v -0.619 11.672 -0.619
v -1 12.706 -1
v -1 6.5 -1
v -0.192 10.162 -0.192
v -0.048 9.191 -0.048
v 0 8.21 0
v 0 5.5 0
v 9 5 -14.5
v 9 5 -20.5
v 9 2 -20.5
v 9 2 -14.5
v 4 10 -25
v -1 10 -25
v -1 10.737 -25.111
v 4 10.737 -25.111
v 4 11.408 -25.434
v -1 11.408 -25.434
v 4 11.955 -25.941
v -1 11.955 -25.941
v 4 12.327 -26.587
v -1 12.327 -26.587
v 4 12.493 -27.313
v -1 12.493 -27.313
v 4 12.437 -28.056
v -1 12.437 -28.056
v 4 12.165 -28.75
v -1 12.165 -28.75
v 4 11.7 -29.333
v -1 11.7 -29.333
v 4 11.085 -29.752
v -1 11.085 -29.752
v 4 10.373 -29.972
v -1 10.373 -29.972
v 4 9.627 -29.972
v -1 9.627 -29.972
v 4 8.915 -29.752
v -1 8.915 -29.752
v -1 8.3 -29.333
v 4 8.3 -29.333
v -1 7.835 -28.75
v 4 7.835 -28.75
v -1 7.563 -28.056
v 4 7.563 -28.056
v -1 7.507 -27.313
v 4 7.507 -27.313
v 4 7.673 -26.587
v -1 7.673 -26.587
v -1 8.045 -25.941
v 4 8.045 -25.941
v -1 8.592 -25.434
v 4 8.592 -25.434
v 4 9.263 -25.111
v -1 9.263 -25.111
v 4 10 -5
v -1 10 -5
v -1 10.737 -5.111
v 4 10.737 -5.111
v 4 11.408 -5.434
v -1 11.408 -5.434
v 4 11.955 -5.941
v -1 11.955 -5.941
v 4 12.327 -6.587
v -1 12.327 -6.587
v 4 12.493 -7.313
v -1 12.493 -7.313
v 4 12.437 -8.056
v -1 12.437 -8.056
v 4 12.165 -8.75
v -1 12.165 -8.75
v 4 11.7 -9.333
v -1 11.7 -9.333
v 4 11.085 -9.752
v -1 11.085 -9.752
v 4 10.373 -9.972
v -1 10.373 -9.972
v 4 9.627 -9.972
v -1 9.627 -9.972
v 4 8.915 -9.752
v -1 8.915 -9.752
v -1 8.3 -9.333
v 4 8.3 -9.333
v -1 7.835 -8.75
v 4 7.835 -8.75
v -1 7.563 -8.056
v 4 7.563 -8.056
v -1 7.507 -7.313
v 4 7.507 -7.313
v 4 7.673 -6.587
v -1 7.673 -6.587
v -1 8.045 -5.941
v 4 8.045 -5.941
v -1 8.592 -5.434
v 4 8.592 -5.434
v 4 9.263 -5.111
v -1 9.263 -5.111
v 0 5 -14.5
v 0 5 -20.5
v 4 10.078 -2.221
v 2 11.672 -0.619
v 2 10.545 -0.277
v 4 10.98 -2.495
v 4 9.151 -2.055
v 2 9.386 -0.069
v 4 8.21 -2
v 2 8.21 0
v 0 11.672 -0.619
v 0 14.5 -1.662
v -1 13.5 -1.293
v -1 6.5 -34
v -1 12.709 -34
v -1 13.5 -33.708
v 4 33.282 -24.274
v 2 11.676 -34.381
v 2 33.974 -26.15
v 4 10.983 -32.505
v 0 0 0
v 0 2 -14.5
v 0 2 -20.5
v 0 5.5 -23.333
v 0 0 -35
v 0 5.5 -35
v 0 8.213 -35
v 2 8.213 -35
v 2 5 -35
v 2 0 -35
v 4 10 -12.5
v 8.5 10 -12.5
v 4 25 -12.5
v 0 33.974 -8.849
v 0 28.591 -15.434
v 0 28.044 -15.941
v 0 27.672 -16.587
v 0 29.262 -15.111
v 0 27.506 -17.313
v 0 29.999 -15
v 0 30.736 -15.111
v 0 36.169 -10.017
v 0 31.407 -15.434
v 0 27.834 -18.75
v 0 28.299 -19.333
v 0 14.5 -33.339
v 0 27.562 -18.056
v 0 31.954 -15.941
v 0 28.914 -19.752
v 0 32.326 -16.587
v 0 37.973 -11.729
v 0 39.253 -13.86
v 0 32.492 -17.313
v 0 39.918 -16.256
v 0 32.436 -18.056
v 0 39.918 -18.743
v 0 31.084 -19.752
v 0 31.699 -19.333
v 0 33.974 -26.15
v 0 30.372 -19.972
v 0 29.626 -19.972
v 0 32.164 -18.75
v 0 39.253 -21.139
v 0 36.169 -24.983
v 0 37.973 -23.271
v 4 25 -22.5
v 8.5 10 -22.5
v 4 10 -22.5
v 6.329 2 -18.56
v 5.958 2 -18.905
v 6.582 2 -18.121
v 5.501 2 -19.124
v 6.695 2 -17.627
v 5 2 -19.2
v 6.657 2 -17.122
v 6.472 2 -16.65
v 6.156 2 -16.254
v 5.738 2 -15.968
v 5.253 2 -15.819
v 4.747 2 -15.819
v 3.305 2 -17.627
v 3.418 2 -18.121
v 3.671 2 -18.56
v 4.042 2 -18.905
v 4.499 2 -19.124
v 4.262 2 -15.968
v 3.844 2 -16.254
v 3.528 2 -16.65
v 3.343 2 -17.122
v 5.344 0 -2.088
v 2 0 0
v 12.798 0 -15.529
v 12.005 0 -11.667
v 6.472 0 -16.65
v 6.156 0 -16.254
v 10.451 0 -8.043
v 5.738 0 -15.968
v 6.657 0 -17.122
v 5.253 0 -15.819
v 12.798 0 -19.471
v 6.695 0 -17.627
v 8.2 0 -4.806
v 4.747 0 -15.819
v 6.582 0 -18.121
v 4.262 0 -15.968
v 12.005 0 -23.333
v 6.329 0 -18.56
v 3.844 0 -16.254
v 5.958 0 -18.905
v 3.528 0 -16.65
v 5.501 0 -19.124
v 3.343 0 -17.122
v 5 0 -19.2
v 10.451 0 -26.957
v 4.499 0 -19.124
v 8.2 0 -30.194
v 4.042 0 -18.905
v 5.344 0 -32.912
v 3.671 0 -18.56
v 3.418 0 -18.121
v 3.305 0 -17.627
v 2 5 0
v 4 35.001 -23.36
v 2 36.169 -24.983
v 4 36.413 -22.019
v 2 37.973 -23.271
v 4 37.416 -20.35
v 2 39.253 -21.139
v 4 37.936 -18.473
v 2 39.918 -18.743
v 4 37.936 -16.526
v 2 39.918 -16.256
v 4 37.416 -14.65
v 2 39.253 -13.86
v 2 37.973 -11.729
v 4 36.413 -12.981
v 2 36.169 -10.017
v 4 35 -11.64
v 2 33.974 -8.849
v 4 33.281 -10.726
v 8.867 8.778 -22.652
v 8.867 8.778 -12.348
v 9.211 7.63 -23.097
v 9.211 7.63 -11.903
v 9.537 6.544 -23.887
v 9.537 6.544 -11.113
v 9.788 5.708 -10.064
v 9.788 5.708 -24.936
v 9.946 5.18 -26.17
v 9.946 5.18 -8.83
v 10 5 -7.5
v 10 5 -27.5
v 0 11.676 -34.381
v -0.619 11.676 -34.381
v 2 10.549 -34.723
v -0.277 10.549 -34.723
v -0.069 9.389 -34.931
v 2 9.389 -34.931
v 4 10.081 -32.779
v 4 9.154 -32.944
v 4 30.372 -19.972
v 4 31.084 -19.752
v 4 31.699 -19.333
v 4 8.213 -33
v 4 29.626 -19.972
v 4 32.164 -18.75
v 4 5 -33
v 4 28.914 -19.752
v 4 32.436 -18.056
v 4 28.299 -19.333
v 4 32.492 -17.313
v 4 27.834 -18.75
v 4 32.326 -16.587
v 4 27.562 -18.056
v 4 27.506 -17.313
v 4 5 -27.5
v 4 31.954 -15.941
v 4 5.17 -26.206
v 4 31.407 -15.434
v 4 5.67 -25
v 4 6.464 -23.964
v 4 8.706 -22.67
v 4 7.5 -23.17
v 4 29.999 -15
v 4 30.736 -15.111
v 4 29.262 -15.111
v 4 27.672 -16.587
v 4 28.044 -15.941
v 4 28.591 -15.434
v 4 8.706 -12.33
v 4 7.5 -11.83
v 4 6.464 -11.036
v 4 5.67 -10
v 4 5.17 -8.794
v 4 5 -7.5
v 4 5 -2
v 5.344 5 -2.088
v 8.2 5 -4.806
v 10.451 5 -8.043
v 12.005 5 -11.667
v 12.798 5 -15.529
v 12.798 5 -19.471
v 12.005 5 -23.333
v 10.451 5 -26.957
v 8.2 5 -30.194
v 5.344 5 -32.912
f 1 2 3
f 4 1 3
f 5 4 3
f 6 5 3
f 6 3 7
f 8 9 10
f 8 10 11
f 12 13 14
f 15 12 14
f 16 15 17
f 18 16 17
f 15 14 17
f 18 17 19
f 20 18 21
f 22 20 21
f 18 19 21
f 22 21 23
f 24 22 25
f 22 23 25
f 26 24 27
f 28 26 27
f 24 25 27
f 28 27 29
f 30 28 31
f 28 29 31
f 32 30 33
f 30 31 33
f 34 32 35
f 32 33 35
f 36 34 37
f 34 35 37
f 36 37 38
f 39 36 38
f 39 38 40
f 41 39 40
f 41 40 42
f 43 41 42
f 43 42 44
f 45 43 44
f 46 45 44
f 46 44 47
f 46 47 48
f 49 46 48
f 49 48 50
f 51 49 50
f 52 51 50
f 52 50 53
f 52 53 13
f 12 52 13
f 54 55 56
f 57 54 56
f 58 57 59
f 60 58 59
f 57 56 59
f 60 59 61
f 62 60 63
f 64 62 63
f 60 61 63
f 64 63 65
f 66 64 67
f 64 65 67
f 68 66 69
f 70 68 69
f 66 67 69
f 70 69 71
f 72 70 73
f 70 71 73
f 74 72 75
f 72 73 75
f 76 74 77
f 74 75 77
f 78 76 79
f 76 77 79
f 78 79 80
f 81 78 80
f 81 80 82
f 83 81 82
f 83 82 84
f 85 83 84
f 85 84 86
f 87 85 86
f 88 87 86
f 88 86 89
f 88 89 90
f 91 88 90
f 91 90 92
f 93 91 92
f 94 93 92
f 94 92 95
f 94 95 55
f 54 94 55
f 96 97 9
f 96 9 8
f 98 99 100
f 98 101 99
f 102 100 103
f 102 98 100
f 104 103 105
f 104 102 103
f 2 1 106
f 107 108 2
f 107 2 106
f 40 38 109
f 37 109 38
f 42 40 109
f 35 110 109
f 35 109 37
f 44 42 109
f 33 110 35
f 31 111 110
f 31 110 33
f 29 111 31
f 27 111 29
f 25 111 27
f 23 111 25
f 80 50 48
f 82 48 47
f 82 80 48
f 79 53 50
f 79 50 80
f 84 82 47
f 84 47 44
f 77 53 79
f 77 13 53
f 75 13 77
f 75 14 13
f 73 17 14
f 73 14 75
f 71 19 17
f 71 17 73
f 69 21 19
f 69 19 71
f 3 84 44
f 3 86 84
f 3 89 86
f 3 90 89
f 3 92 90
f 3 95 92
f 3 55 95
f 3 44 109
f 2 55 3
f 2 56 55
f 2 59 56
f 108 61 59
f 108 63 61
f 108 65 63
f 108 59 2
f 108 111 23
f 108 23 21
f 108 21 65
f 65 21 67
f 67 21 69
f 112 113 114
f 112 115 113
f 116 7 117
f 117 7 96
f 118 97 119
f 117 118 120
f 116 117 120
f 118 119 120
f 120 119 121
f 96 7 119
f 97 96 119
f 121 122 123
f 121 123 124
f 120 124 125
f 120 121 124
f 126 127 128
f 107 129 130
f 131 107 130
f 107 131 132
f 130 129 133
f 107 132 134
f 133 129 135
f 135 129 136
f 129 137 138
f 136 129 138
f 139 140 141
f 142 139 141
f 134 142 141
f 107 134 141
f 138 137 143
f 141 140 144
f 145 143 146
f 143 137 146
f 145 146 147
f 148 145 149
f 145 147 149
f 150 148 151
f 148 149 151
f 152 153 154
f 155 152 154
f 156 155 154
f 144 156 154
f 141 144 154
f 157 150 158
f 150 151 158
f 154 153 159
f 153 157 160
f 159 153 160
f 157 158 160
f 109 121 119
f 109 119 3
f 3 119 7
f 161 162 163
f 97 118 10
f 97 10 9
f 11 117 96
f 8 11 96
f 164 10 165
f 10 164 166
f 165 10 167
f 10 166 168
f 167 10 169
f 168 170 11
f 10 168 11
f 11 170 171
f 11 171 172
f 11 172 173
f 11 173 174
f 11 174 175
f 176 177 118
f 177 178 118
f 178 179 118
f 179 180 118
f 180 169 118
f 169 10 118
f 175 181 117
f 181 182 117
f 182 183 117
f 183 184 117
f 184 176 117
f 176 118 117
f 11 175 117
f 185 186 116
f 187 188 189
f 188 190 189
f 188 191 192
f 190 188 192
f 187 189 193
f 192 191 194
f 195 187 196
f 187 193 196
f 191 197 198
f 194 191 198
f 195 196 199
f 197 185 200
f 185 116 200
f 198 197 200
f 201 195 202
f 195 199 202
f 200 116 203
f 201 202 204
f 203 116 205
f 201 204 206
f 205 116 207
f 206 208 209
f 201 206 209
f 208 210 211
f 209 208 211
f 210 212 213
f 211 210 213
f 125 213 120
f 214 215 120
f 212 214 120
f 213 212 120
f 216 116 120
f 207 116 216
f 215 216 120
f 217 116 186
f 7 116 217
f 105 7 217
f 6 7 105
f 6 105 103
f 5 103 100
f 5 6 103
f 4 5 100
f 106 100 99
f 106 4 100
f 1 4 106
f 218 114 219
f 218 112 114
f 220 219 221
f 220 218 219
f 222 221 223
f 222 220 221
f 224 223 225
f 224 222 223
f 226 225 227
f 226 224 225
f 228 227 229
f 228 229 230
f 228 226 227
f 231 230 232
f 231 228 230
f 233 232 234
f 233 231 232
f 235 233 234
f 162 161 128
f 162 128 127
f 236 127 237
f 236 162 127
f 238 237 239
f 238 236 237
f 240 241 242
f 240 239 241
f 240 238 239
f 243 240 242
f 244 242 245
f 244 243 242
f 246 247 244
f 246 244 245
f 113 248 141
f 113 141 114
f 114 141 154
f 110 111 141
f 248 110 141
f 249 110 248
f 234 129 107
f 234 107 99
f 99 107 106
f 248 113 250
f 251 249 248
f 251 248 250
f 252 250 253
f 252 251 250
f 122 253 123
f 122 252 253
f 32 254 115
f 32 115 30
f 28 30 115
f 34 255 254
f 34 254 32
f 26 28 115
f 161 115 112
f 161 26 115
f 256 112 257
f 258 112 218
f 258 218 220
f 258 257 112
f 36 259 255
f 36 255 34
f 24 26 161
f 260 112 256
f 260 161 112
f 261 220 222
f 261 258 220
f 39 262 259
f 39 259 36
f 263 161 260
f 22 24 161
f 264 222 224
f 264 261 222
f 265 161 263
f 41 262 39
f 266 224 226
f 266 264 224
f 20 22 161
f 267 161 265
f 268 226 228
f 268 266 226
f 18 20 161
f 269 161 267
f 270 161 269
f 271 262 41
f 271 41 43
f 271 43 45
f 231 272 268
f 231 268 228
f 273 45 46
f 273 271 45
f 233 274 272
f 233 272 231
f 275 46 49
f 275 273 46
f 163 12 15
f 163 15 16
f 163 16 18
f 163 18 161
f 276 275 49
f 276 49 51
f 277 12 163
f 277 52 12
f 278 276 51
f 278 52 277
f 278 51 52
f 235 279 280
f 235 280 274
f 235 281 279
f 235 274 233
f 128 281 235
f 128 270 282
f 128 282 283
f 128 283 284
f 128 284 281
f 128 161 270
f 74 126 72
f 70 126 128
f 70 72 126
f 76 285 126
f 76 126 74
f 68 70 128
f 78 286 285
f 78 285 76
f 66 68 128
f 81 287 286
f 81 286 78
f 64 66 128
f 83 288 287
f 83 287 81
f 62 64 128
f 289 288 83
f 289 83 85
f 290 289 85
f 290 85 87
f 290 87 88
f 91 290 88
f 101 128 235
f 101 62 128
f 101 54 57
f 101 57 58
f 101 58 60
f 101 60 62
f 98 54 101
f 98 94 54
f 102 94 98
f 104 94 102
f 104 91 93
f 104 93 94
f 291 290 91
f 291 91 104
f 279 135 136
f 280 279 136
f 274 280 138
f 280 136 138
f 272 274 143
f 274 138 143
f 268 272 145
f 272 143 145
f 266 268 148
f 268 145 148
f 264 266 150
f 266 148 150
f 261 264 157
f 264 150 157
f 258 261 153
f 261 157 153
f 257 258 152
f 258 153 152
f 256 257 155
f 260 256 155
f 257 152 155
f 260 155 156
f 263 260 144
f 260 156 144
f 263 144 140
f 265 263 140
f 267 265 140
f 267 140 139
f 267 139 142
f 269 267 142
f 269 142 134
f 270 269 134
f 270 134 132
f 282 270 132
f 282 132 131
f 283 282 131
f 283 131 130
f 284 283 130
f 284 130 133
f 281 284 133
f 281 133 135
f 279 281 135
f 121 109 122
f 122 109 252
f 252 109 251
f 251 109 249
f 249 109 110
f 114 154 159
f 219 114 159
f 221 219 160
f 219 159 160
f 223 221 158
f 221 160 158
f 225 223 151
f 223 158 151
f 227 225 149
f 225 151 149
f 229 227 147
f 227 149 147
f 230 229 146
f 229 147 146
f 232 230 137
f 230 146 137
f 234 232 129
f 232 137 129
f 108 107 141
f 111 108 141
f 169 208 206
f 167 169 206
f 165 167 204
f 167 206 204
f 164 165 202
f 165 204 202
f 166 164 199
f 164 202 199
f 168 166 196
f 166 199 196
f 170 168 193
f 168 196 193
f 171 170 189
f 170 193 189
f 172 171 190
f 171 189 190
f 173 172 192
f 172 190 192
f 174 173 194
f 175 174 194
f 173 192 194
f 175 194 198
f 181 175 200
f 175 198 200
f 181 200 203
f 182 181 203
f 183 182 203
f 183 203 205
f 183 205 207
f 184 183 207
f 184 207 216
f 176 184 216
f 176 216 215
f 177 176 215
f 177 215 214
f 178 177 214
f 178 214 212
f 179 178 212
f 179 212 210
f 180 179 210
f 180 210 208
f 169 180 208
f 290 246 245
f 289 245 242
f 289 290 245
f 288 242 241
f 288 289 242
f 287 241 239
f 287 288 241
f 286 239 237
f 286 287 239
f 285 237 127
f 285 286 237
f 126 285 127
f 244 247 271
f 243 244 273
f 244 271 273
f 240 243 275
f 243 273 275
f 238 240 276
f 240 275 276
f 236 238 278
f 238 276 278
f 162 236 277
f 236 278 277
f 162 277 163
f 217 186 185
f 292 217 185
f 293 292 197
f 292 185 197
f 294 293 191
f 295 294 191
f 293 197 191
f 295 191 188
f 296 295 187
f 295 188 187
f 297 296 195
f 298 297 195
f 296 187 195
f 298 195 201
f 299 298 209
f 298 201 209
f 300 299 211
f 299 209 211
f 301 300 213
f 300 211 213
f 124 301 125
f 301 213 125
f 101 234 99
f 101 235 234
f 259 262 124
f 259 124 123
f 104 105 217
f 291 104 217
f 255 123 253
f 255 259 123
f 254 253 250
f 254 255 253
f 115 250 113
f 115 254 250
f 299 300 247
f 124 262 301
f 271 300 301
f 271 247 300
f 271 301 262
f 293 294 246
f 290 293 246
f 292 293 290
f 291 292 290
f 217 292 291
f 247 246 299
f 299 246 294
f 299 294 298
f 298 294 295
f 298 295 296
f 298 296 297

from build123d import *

# Parameters (mm, degrees)
BOSS_EXTRUDE1_DEPTH = 2
BOSS_EXTRUDE2_DEPTH = 2
BOSS_EXTRUDE2_TAPER = 45
BOSS_EXTRUDE3_DEPTH = 5
BOSS_EXTRUDE4_START = 1
BOSS_EXTRUDE4_DEPTH = 1
CHAMFER1_SIZE       = 1
SKETCH6_R           = 2.5
CUT_EXTRUDE1_DEPTH  = 55.939106152
SKETCH8_R           = 2.5
CUT_EXTRUDE2_DEPTH  = 55.694698419
BOSS_EXTRUDE5_DEPTH = 10
FILLET1_R           = 5
SKETCH10_W          = 6
SKETCH10_H          = 3
CUT_EXTRUDE3_DEPTH  = 9
CUT_EXTRUDE4_REACH  = 56.695
SKETCH11_R          = 1.7


# Some blends are built 0.0001 mm under size
with BuildPart() as part:
    # Sketch1 → Boss-Extrude1 (new body)
    with BuildSketch(Plane(origin=(0, 0, 0), x_dir=(0, 0, -1), z_dir=(1, 0, 0))):
        with BuildLine():
            Line((0, 0), (35, 0))
            Line((35, 0), (35, 8.213))
            ThreePointArc((35, 8.213), (34.84410791, 9.971846057), (34.381292109, 11.675854077))
            Line((34.381292109, 11.675854077), (26.150489454, 33.974097745))
            ThreePointArc((26.150489454, 33.974097745), (17.499798515, 40.001999998), (8.849371011, 33.973719703))
            Line((8.849371011, 33.973719703), (0.618556568, 11.672444098))
            ThreePointArc((0.618556568, 11.672444098), (0.15585366, 9.968630956), (0, 8.21))
            Line((0, 8.21), (0, 0))
        make_face()
    extrude(amount=BOSS_EXTRUDE1_DEPTH)

    # Sketch2 → Boss-Extrude2 (add)
    with BuildSketch(Plane(origin=(2, 0, 0), x_dir=(0, 0, -1), z_dir=(1, 0, 0))):
        with BuildLine():
            Line((8.849371011, 33.973719703), (0.618556568, 11.672444098))
            ThreePointArc((0.618556568, 11.672444098), (0.15585366, 9.968630956), (0, 8.21))
            Line((0, 8.21), (0, 0))
            Line((0, 0), (35, 0))
            Line((35, 0), (35, 8.213))
            ThreePointArc((35, 8.213), (34.84410791, 9.971846057), (34.381292109, 11.675854077))
            Line((34.381292109, 11.675854077), (26.150489454, 33.974097745))
            ThreePointArc((26.150489454, 33.974097745), (17.499798515, 40.001999998), (8.849371011, 33.973719703))
        make_face()
    extrude(amount=BOSS_EXTRUDE2_DEPTH, taper=BOSS_EXTRUDE2_TAPER)

    # Sketch4 → Boss-Extrude3 (add)
    with BuildSketch(Plane.XZ):
        with BuildLine():
            Line((0, 0), (2, 0))
            ThreePointArc((2, 0), (12.897674733, -17.5), (2, -35))
            Line((2, -35), (0, -35))
            Line((0, -35), (0, 0))
        make_face()
    extrude(amount=-BOSS_EXTRUDE3_DEPTH)

    # Sketch5 → Boss-Extrude4 (add)
    with BuildSketch(Plane.ZY.offset(BOSS_EXTRUDE4_START)):
        with BuildLine():
            Line((0, 5.5), (0, 8.21))
            ThreePointArc((0, 8.21), (-0.15585366, 9.968630956), (-0.618556568, 11.672444098))
            Line((-0.618556568, 11.672444098), (-1.662133105, 14.5))
            Line((-1.662133105, 14.5), (-33.338833873, 14.5))
            Line((-33.338833873, 14.5), (-34.381292109, 11.675854077))
            ThreePointArc((-34.381292109, 11.675854077), (-34.84410791, 9.971846057), (-35, 8.213))
            Line((-35, 8.213), (-35, 5.5))
            Line((-35, 5.5), (0, 5.5))
        make_face()
    extrude(amount=-BOSS_EXTRUDE4_DEPTH)

    # Chamfer1
    chamfer1_edges = [part.edges().sort_by_distance(p)[0] for p in [
        (-1, 14.5, -17.500483489),
        (-1, 5.5, -17.5),
    ]]
    chamfer(chamfer1_edges, length=CHAMFER1_SIZE - 0.0001)  # a hair under: the kernel refuses the full size

    # Chamfer2
    # the kernel refuses this chamfer: 1 mm, written as the material it takes off along each edge
    with BuildSketch(Plane(origin=(-1, 0.327860829, 0), x_dir=(-0.027495876610586275, 0, -0.9996219169112968), z_dir=(0, 1, 0))) as chamfer2_piece_1:
        with BuildLine():
            Line((1.028673195, 0), (-0.056547155, -1.027117794))
            Line((-0.056547155, -1.027117794), (-0.076539593, -1.026567876))
            ThreePointArc((-0.076539593, -1.026567876), (-0.034129227, -0.51339783), (-0.019992438, 0.000549918))
            Line((-0.019992438, 0.000549918), (0.000549918, 0.019992438))
            ThreePointArc((0.000549918, 0.019992438), (0.514497665, 0.00585565), (1.029223113, 0.019992438))
            Line((1.029223113, 0.019992438), (1.028673195, 0))
        make_face()
    extrude(amount=14.054178342, mode=Mode.SUBTRACT)
    with BuildSketch(Plane(origin=(-1, 14.385039171, -35), x_dir=(-0.0274958766105862, 0, 0.9996219169112968), z_dir=(0, -1, 0))) as chamfer2_piece_2:
        with BuildLine():
            Line((1.028673195, 0), (-0.056547155, -1.027117794))
            Line((-0.056547155, -1.027117794), (-0.076539593, -1.026567876))
            ThreePointArc((-0.076539593, -1.026567876), (-0.034129227, -0.51339783), (-0.019992438, 0.000549918))
            Line((-0.019992438, 0.000549918), (0.000549918, 0.019992438))
            ThreePointArc((0.000549918, 0.019992438), (0.514497665, 0.00585565), (1.029223113, 0.019992438))
            Line((1.029223113, 0.019992438), (1.028673195, 0))
        make_face()
    extrude(amount=14.057178342, mode=Mode.SUBTRACT)

    # Sketch6 → Cut-Extrude1 (cut, through all)
    with BuildSketch(Plane.ZY.offset(1)):
        with Locations((-27.5, 10)):
            Circle(SKETCH6_R)
        with Locations((-7.5, 10)):
            Circle(SKETCH6_R)
    extrude(amount=-CUT_EXTRUDE1_DEPTH, mode=Mode.SUBTRACT)

    # Sketch8 → Cut-Extrude2 (cut, through all)
    with BuildSketch(Plane.ZY):
        with Locations((-17.5, 29.999)):
            Circle(SKETCH8_R)
    extrude(amount=-CUT_EXTRUDE2_DEPTH, mode=Mode.SUBTRACT)

    # Sketch9 → Boss-Extrude5 (add)
    with BuildSketch(Plane(origin=(0, 0, -22.5), x_dir=(-1, 0, 0), z_dir=(0, 0, -1))):
        Polygon((-4, 5), (-4, 25), (-10, 5), align=None)
    extrude(amount=-BOSS_EXTRUDE5_DEPTH)

    # Fillet1
    fillet1_edges = [part.edges().sort_by_distance(p)[0] for p in [
        (7, 5, -12.5),
        (7, 5, -22.5),
    ]]
    fillet(fillet1_edges, radius=FILLET1_R)

    # Sketch10 → Cut-Extrude3 (cut)
    with BuildSketch(Plane.ZY):
        with Locations((-17.5, 3.5)):
            Rectangle(SKETCH10_W, SKETCH10_H)
    extrude(amount=-CUT_EXTRUDE3_DEPTH, mode=Mode.SUBTRACT)

    # Sketch11 → Cut-Extrude4 (cut, up to next)
    with BuildSketch(Plane.XZ, mode=Mode.PRIVATE) as cut_extrude4_sk1:
        with Locations(Location((5, -17.5, 0), (0, 0, 270))):
            Circle(SKETCH11_R)
    cut_extrude4_tool1 = extrude(cut_extrude4_sk1.sketch, amount=-CUT_EXTRUDE4_REACH, mode=Mode.PRIVATE) & part.part
    add(cut_extrude4_tool1.solids().sort_by_distance((5, 0, -17.5))[0], mode=Mode.SUBTRACT)


solid = part.part
